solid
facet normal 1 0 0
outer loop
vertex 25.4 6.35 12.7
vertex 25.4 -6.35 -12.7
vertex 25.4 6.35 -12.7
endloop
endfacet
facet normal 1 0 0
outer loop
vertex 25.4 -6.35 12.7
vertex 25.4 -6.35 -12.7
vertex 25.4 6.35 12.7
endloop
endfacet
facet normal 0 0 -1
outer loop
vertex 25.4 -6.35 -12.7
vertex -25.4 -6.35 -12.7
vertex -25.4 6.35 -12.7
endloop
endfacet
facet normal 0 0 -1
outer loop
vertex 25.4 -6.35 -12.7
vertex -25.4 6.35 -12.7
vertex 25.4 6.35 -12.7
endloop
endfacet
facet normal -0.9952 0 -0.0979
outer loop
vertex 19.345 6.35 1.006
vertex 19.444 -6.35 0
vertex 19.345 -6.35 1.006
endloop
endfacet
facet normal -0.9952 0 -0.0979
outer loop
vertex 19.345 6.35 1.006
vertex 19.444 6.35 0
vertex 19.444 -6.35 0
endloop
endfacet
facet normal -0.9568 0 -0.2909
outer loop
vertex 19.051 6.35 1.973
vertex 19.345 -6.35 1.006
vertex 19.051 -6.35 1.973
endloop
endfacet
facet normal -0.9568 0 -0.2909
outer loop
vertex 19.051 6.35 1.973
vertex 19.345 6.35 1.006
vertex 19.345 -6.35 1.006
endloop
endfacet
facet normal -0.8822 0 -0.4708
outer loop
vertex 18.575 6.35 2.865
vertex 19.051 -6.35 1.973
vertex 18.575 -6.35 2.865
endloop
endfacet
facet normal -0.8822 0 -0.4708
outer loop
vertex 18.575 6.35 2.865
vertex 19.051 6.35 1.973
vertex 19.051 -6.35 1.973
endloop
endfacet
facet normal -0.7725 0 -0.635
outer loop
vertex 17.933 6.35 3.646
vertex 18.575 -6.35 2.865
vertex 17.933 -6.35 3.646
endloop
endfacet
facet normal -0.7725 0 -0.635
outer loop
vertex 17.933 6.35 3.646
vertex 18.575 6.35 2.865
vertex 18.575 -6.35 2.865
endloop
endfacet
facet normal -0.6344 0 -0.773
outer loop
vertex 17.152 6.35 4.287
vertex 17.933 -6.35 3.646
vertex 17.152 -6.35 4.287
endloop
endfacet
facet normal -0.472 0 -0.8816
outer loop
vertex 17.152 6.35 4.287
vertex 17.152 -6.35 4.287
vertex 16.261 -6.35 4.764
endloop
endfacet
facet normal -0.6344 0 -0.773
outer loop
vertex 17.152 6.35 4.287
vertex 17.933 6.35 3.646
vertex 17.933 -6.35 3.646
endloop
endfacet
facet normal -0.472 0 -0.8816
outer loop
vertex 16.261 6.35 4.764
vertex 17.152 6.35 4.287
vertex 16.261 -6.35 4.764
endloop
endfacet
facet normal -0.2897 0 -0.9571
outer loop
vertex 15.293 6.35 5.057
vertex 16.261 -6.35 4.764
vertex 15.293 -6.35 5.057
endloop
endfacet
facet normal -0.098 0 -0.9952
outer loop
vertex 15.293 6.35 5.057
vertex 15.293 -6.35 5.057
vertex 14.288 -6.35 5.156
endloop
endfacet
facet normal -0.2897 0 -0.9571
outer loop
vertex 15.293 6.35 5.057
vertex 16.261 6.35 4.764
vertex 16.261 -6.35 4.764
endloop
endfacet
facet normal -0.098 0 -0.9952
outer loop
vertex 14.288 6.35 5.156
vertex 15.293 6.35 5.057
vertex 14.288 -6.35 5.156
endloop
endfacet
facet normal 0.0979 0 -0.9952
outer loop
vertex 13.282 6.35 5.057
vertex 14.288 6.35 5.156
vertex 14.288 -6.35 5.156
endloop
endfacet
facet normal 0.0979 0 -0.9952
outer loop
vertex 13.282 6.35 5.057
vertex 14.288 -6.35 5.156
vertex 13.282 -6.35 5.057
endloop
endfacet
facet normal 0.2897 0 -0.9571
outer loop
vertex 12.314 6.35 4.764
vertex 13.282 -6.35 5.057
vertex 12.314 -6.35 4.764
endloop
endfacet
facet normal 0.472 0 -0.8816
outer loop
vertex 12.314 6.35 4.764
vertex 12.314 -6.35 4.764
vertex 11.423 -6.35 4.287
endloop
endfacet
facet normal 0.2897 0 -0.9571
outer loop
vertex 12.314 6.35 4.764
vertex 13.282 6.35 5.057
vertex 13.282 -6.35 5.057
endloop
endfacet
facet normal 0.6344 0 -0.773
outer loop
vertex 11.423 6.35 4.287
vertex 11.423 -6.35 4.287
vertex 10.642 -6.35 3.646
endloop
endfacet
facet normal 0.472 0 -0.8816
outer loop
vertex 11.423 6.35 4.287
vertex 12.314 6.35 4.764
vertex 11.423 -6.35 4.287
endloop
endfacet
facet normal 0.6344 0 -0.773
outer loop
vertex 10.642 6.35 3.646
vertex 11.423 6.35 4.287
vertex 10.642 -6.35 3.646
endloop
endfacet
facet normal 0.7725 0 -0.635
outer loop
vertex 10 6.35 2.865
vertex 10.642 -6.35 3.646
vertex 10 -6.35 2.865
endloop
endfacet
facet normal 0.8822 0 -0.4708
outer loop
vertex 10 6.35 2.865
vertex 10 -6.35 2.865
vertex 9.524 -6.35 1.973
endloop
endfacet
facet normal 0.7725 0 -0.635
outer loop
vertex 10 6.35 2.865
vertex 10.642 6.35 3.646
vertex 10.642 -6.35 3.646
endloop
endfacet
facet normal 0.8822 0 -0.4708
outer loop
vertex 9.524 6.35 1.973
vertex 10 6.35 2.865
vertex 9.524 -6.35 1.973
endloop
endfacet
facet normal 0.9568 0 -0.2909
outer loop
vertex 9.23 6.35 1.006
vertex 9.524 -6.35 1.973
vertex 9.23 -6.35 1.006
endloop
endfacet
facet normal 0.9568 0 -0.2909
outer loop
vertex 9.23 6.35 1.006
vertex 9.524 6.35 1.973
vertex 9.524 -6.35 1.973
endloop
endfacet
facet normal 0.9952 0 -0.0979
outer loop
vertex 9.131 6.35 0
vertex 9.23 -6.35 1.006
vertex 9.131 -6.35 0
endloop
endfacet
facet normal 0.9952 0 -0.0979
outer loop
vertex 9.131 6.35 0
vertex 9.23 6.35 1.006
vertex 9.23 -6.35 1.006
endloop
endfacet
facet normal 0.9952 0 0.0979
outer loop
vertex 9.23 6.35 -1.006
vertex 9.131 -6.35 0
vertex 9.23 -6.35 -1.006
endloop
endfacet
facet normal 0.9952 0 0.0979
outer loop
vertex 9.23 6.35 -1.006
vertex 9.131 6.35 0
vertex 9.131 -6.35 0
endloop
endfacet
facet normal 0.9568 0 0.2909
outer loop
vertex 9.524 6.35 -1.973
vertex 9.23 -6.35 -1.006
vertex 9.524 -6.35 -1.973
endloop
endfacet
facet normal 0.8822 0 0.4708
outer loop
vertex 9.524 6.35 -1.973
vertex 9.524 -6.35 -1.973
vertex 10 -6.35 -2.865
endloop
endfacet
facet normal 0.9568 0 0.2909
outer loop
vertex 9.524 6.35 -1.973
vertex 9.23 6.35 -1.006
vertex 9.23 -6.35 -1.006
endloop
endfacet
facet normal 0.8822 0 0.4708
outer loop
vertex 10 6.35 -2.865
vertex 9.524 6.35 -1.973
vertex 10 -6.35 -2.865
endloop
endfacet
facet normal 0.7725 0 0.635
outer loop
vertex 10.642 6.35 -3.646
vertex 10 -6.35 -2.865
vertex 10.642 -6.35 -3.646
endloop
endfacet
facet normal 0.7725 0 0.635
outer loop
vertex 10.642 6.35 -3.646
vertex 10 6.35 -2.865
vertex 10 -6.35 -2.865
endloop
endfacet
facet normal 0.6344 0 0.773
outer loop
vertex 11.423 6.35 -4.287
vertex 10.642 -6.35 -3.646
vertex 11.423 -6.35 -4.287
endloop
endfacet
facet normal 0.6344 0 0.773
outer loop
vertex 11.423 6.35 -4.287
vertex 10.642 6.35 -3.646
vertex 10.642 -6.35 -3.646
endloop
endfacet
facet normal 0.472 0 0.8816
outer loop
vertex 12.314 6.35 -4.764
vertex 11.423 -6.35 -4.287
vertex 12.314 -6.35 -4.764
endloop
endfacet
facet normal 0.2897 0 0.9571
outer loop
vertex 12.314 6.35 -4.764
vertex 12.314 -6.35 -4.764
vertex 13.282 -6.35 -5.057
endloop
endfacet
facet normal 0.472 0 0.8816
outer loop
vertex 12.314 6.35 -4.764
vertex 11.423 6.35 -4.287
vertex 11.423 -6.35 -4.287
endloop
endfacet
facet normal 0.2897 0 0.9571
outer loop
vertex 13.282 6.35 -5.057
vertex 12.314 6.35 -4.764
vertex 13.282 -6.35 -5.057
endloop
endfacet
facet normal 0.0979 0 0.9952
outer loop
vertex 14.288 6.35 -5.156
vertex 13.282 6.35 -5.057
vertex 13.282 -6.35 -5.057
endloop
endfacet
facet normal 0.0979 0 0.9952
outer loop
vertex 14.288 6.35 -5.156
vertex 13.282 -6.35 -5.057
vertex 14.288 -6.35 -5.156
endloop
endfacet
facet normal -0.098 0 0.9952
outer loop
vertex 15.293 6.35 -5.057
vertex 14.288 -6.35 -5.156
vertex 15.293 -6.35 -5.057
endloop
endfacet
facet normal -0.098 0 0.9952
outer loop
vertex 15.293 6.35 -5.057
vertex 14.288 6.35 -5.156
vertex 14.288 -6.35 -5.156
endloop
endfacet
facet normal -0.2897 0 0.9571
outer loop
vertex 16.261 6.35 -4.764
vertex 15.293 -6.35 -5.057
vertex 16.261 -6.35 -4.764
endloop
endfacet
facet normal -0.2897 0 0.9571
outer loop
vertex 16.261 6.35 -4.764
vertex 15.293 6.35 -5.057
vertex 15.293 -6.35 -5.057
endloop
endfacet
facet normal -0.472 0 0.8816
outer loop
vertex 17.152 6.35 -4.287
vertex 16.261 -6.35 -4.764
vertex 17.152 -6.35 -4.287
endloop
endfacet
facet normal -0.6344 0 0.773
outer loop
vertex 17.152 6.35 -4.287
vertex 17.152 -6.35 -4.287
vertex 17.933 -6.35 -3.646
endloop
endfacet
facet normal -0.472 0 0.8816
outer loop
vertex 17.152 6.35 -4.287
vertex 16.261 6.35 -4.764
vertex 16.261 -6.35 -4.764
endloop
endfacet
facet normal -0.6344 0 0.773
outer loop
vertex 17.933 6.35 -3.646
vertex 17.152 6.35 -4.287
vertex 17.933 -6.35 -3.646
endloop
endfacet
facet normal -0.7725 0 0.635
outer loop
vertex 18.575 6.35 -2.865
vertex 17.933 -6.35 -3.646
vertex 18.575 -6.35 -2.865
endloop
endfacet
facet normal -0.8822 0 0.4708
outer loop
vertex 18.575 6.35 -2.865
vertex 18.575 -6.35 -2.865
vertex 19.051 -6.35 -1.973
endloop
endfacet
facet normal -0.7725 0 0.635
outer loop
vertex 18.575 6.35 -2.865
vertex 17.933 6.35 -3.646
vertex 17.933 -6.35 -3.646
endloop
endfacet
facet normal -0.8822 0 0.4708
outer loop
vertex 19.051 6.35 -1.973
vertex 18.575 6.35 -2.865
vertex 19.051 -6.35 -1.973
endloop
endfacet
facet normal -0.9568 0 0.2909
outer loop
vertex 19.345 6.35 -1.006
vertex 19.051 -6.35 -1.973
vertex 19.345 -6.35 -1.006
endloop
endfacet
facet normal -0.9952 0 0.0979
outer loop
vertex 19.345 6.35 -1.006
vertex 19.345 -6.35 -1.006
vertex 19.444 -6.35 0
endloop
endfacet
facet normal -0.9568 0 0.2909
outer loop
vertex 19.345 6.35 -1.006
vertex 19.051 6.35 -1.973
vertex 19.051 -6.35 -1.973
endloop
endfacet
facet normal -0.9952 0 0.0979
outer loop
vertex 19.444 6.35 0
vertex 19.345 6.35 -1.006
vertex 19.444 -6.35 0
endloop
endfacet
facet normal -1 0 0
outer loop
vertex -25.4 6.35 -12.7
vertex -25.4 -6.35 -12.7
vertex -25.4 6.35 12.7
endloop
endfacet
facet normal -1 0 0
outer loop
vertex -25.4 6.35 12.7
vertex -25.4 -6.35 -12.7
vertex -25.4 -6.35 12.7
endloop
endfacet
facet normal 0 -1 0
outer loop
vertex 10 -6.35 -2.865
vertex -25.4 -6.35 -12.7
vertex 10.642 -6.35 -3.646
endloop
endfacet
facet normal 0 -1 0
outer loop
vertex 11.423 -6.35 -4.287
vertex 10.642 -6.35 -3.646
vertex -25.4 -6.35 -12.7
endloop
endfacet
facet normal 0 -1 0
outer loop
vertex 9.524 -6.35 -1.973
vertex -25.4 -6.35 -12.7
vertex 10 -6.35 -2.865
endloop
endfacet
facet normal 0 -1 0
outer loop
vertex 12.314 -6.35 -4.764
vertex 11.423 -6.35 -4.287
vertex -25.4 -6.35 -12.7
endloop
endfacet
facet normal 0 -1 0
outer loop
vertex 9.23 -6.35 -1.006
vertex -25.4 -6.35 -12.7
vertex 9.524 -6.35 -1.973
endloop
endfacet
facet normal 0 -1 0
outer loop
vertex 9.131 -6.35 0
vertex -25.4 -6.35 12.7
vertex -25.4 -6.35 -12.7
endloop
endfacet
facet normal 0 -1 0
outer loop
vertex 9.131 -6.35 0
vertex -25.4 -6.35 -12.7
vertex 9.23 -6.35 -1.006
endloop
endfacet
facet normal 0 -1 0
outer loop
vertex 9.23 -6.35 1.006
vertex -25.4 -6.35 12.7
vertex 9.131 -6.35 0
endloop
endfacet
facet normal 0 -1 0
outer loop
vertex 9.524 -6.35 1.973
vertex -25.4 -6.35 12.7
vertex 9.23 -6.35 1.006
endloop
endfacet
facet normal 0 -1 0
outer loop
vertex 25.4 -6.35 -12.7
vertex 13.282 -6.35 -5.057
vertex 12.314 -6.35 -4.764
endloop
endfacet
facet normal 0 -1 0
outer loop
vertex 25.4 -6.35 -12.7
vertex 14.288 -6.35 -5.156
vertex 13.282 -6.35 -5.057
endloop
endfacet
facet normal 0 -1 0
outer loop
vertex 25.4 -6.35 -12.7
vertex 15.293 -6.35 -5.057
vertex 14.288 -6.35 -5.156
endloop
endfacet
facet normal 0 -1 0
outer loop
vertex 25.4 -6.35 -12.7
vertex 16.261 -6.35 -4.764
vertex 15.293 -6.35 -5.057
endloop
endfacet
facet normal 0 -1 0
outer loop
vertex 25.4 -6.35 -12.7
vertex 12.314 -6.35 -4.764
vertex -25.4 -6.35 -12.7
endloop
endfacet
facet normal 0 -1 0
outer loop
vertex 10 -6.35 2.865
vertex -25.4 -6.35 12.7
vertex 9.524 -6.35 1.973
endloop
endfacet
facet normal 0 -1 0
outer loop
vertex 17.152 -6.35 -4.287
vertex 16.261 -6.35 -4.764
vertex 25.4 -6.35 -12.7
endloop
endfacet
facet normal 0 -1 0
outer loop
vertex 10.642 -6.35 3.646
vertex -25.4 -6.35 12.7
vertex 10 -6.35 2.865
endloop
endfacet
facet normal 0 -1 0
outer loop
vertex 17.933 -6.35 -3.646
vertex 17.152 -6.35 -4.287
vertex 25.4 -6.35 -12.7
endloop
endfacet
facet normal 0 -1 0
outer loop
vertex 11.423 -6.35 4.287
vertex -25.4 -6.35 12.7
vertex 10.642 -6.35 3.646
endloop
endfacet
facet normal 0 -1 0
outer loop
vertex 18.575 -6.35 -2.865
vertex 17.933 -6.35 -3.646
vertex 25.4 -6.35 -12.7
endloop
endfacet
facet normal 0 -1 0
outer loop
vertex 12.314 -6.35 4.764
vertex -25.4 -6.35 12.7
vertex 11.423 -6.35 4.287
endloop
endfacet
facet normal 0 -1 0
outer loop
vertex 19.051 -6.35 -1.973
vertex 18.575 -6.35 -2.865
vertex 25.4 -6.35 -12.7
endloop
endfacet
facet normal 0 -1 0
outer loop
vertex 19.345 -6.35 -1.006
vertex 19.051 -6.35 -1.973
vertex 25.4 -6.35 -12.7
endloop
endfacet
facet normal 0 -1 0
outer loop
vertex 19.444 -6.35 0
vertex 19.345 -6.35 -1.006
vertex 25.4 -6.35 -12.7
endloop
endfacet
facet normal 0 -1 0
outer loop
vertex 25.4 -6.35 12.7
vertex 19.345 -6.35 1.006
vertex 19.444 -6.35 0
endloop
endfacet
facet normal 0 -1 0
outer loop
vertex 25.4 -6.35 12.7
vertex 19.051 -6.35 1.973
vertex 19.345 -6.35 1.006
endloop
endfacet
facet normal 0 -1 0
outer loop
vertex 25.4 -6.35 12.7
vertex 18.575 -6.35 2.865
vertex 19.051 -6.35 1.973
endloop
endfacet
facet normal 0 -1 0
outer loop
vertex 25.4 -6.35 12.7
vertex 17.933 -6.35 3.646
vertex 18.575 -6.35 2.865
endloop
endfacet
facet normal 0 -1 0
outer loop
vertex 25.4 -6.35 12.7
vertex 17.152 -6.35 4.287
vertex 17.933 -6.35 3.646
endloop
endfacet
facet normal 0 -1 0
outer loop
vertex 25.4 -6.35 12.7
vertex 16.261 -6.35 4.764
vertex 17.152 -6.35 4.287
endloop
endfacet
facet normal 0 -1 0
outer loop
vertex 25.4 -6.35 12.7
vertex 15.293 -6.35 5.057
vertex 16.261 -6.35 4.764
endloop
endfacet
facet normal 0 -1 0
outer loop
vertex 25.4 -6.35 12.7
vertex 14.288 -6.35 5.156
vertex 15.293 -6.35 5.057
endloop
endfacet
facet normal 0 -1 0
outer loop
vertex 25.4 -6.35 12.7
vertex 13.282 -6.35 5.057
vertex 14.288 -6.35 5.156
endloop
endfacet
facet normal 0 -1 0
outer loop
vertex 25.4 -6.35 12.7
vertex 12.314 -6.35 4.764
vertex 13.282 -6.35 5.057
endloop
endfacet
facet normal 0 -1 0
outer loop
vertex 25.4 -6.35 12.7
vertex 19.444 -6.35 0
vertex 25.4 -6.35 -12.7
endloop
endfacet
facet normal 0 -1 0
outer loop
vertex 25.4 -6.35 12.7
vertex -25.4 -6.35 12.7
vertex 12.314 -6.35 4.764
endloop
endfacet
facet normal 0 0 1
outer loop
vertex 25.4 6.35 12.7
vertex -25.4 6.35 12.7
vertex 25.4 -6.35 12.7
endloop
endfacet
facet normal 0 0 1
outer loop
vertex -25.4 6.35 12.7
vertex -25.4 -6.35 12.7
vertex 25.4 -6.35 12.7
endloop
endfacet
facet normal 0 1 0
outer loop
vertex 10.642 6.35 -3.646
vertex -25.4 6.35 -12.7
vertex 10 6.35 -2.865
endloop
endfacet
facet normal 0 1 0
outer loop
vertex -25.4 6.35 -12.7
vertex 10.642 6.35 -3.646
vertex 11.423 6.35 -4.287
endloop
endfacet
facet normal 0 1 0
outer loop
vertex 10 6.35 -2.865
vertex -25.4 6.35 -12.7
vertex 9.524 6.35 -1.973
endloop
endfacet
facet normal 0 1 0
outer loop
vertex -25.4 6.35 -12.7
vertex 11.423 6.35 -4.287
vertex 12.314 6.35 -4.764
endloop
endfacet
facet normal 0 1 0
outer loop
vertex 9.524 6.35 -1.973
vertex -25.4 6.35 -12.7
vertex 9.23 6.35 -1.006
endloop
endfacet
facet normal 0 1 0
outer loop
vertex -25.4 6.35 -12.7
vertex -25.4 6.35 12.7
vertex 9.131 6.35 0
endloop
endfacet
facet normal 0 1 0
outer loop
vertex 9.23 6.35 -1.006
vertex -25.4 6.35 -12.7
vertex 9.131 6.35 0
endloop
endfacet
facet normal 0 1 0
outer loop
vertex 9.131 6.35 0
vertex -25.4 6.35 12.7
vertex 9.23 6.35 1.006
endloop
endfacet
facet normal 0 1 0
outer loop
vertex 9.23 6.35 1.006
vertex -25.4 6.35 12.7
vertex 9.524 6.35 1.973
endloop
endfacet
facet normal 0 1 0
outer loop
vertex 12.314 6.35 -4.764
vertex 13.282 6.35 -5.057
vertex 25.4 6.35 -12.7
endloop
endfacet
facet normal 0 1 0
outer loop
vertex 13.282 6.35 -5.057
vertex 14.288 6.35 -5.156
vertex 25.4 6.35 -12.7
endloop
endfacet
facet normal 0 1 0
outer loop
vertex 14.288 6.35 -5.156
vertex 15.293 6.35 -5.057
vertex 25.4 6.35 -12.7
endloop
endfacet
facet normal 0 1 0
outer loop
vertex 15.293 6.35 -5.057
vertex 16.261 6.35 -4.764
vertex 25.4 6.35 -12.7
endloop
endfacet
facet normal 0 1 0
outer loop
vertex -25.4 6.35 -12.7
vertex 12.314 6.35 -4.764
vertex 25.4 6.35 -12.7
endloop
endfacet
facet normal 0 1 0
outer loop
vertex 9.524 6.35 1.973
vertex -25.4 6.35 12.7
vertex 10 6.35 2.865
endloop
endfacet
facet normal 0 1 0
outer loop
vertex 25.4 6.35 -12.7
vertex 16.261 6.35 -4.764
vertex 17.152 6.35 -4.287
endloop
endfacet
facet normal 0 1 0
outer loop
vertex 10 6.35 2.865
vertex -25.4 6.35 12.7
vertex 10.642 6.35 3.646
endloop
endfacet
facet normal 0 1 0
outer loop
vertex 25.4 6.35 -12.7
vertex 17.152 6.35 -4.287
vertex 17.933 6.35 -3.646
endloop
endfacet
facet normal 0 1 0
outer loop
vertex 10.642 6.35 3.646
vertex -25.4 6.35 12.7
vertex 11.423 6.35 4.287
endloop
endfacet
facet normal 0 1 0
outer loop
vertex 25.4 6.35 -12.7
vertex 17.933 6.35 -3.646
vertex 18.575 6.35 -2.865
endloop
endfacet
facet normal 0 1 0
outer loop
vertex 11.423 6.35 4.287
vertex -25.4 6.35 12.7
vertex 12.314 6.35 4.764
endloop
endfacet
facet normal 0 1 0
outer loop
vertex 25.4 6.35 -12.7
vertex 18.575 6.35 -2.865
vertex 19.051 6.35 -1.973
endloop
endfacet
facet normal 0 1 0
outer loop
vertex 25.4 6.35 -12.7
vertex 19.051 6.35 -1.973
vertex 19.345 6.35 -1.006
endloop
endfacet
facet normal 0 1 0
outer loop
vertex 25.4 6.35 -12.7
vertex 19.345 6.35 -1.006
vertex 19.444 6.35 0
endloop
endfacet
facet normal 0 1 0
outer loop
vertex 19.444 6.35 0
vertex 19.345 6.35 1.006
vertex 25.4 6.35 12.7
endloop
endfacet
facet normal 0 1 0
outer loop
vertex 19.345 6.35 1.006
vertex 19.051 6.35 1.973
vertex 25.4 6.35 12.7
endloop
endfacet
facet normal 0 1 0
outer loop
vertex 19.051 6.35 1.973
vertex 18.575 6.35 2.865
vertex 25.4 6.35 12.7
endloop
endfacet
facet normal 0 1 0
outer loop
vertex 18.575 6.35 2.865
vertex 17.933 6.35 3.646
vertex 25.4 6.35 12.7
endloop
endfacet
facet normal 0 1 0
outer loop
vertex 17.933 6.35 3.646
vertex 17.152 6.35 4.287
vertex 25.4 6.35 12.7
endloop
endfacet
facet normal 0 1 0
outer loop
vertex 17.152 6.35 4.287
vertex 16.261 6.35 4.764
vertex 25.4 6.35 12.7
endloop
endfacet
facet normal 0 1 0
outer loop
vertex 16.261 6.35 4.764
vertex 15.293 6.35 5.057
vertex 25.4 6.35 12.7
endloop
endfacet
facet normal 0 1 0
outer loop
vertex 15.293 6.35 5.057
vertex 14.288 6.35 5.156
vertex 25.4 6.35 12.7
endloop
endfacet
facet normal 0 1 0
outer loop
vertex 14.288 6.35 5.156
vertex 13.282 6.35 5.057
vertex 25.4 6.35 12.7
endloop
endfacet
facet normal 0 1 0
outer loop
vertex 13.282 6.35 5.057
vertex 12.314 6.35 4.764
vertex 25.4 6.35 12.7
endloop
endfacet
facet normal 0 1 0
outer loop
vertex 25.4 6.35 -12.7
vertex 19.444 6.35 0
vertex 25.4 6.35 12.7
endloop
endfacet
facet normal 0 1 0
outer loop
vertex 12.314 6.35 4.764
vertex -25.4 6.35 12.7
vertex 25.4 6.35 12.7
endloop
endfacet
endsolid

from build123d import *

# Parameters (mm, degrees)
F0_W     = 50.8
F0_H     = 25.4
F0_R     = 5.1562
F1_DEPTH = 6.35


with BuildPart() as f1:
    # F0 (on Front) → F1 (new body, symmetric)
    with BuildSketch(Plane.XZ):
        Rectangle(F0_W, F0_H)
        with Locations((14.2875, 0)):
            Circle(F0_R, mode=Mode.SUBTRACT)
    extrude(amount=F1_DEPTH, both=True)


solid = f1.part
